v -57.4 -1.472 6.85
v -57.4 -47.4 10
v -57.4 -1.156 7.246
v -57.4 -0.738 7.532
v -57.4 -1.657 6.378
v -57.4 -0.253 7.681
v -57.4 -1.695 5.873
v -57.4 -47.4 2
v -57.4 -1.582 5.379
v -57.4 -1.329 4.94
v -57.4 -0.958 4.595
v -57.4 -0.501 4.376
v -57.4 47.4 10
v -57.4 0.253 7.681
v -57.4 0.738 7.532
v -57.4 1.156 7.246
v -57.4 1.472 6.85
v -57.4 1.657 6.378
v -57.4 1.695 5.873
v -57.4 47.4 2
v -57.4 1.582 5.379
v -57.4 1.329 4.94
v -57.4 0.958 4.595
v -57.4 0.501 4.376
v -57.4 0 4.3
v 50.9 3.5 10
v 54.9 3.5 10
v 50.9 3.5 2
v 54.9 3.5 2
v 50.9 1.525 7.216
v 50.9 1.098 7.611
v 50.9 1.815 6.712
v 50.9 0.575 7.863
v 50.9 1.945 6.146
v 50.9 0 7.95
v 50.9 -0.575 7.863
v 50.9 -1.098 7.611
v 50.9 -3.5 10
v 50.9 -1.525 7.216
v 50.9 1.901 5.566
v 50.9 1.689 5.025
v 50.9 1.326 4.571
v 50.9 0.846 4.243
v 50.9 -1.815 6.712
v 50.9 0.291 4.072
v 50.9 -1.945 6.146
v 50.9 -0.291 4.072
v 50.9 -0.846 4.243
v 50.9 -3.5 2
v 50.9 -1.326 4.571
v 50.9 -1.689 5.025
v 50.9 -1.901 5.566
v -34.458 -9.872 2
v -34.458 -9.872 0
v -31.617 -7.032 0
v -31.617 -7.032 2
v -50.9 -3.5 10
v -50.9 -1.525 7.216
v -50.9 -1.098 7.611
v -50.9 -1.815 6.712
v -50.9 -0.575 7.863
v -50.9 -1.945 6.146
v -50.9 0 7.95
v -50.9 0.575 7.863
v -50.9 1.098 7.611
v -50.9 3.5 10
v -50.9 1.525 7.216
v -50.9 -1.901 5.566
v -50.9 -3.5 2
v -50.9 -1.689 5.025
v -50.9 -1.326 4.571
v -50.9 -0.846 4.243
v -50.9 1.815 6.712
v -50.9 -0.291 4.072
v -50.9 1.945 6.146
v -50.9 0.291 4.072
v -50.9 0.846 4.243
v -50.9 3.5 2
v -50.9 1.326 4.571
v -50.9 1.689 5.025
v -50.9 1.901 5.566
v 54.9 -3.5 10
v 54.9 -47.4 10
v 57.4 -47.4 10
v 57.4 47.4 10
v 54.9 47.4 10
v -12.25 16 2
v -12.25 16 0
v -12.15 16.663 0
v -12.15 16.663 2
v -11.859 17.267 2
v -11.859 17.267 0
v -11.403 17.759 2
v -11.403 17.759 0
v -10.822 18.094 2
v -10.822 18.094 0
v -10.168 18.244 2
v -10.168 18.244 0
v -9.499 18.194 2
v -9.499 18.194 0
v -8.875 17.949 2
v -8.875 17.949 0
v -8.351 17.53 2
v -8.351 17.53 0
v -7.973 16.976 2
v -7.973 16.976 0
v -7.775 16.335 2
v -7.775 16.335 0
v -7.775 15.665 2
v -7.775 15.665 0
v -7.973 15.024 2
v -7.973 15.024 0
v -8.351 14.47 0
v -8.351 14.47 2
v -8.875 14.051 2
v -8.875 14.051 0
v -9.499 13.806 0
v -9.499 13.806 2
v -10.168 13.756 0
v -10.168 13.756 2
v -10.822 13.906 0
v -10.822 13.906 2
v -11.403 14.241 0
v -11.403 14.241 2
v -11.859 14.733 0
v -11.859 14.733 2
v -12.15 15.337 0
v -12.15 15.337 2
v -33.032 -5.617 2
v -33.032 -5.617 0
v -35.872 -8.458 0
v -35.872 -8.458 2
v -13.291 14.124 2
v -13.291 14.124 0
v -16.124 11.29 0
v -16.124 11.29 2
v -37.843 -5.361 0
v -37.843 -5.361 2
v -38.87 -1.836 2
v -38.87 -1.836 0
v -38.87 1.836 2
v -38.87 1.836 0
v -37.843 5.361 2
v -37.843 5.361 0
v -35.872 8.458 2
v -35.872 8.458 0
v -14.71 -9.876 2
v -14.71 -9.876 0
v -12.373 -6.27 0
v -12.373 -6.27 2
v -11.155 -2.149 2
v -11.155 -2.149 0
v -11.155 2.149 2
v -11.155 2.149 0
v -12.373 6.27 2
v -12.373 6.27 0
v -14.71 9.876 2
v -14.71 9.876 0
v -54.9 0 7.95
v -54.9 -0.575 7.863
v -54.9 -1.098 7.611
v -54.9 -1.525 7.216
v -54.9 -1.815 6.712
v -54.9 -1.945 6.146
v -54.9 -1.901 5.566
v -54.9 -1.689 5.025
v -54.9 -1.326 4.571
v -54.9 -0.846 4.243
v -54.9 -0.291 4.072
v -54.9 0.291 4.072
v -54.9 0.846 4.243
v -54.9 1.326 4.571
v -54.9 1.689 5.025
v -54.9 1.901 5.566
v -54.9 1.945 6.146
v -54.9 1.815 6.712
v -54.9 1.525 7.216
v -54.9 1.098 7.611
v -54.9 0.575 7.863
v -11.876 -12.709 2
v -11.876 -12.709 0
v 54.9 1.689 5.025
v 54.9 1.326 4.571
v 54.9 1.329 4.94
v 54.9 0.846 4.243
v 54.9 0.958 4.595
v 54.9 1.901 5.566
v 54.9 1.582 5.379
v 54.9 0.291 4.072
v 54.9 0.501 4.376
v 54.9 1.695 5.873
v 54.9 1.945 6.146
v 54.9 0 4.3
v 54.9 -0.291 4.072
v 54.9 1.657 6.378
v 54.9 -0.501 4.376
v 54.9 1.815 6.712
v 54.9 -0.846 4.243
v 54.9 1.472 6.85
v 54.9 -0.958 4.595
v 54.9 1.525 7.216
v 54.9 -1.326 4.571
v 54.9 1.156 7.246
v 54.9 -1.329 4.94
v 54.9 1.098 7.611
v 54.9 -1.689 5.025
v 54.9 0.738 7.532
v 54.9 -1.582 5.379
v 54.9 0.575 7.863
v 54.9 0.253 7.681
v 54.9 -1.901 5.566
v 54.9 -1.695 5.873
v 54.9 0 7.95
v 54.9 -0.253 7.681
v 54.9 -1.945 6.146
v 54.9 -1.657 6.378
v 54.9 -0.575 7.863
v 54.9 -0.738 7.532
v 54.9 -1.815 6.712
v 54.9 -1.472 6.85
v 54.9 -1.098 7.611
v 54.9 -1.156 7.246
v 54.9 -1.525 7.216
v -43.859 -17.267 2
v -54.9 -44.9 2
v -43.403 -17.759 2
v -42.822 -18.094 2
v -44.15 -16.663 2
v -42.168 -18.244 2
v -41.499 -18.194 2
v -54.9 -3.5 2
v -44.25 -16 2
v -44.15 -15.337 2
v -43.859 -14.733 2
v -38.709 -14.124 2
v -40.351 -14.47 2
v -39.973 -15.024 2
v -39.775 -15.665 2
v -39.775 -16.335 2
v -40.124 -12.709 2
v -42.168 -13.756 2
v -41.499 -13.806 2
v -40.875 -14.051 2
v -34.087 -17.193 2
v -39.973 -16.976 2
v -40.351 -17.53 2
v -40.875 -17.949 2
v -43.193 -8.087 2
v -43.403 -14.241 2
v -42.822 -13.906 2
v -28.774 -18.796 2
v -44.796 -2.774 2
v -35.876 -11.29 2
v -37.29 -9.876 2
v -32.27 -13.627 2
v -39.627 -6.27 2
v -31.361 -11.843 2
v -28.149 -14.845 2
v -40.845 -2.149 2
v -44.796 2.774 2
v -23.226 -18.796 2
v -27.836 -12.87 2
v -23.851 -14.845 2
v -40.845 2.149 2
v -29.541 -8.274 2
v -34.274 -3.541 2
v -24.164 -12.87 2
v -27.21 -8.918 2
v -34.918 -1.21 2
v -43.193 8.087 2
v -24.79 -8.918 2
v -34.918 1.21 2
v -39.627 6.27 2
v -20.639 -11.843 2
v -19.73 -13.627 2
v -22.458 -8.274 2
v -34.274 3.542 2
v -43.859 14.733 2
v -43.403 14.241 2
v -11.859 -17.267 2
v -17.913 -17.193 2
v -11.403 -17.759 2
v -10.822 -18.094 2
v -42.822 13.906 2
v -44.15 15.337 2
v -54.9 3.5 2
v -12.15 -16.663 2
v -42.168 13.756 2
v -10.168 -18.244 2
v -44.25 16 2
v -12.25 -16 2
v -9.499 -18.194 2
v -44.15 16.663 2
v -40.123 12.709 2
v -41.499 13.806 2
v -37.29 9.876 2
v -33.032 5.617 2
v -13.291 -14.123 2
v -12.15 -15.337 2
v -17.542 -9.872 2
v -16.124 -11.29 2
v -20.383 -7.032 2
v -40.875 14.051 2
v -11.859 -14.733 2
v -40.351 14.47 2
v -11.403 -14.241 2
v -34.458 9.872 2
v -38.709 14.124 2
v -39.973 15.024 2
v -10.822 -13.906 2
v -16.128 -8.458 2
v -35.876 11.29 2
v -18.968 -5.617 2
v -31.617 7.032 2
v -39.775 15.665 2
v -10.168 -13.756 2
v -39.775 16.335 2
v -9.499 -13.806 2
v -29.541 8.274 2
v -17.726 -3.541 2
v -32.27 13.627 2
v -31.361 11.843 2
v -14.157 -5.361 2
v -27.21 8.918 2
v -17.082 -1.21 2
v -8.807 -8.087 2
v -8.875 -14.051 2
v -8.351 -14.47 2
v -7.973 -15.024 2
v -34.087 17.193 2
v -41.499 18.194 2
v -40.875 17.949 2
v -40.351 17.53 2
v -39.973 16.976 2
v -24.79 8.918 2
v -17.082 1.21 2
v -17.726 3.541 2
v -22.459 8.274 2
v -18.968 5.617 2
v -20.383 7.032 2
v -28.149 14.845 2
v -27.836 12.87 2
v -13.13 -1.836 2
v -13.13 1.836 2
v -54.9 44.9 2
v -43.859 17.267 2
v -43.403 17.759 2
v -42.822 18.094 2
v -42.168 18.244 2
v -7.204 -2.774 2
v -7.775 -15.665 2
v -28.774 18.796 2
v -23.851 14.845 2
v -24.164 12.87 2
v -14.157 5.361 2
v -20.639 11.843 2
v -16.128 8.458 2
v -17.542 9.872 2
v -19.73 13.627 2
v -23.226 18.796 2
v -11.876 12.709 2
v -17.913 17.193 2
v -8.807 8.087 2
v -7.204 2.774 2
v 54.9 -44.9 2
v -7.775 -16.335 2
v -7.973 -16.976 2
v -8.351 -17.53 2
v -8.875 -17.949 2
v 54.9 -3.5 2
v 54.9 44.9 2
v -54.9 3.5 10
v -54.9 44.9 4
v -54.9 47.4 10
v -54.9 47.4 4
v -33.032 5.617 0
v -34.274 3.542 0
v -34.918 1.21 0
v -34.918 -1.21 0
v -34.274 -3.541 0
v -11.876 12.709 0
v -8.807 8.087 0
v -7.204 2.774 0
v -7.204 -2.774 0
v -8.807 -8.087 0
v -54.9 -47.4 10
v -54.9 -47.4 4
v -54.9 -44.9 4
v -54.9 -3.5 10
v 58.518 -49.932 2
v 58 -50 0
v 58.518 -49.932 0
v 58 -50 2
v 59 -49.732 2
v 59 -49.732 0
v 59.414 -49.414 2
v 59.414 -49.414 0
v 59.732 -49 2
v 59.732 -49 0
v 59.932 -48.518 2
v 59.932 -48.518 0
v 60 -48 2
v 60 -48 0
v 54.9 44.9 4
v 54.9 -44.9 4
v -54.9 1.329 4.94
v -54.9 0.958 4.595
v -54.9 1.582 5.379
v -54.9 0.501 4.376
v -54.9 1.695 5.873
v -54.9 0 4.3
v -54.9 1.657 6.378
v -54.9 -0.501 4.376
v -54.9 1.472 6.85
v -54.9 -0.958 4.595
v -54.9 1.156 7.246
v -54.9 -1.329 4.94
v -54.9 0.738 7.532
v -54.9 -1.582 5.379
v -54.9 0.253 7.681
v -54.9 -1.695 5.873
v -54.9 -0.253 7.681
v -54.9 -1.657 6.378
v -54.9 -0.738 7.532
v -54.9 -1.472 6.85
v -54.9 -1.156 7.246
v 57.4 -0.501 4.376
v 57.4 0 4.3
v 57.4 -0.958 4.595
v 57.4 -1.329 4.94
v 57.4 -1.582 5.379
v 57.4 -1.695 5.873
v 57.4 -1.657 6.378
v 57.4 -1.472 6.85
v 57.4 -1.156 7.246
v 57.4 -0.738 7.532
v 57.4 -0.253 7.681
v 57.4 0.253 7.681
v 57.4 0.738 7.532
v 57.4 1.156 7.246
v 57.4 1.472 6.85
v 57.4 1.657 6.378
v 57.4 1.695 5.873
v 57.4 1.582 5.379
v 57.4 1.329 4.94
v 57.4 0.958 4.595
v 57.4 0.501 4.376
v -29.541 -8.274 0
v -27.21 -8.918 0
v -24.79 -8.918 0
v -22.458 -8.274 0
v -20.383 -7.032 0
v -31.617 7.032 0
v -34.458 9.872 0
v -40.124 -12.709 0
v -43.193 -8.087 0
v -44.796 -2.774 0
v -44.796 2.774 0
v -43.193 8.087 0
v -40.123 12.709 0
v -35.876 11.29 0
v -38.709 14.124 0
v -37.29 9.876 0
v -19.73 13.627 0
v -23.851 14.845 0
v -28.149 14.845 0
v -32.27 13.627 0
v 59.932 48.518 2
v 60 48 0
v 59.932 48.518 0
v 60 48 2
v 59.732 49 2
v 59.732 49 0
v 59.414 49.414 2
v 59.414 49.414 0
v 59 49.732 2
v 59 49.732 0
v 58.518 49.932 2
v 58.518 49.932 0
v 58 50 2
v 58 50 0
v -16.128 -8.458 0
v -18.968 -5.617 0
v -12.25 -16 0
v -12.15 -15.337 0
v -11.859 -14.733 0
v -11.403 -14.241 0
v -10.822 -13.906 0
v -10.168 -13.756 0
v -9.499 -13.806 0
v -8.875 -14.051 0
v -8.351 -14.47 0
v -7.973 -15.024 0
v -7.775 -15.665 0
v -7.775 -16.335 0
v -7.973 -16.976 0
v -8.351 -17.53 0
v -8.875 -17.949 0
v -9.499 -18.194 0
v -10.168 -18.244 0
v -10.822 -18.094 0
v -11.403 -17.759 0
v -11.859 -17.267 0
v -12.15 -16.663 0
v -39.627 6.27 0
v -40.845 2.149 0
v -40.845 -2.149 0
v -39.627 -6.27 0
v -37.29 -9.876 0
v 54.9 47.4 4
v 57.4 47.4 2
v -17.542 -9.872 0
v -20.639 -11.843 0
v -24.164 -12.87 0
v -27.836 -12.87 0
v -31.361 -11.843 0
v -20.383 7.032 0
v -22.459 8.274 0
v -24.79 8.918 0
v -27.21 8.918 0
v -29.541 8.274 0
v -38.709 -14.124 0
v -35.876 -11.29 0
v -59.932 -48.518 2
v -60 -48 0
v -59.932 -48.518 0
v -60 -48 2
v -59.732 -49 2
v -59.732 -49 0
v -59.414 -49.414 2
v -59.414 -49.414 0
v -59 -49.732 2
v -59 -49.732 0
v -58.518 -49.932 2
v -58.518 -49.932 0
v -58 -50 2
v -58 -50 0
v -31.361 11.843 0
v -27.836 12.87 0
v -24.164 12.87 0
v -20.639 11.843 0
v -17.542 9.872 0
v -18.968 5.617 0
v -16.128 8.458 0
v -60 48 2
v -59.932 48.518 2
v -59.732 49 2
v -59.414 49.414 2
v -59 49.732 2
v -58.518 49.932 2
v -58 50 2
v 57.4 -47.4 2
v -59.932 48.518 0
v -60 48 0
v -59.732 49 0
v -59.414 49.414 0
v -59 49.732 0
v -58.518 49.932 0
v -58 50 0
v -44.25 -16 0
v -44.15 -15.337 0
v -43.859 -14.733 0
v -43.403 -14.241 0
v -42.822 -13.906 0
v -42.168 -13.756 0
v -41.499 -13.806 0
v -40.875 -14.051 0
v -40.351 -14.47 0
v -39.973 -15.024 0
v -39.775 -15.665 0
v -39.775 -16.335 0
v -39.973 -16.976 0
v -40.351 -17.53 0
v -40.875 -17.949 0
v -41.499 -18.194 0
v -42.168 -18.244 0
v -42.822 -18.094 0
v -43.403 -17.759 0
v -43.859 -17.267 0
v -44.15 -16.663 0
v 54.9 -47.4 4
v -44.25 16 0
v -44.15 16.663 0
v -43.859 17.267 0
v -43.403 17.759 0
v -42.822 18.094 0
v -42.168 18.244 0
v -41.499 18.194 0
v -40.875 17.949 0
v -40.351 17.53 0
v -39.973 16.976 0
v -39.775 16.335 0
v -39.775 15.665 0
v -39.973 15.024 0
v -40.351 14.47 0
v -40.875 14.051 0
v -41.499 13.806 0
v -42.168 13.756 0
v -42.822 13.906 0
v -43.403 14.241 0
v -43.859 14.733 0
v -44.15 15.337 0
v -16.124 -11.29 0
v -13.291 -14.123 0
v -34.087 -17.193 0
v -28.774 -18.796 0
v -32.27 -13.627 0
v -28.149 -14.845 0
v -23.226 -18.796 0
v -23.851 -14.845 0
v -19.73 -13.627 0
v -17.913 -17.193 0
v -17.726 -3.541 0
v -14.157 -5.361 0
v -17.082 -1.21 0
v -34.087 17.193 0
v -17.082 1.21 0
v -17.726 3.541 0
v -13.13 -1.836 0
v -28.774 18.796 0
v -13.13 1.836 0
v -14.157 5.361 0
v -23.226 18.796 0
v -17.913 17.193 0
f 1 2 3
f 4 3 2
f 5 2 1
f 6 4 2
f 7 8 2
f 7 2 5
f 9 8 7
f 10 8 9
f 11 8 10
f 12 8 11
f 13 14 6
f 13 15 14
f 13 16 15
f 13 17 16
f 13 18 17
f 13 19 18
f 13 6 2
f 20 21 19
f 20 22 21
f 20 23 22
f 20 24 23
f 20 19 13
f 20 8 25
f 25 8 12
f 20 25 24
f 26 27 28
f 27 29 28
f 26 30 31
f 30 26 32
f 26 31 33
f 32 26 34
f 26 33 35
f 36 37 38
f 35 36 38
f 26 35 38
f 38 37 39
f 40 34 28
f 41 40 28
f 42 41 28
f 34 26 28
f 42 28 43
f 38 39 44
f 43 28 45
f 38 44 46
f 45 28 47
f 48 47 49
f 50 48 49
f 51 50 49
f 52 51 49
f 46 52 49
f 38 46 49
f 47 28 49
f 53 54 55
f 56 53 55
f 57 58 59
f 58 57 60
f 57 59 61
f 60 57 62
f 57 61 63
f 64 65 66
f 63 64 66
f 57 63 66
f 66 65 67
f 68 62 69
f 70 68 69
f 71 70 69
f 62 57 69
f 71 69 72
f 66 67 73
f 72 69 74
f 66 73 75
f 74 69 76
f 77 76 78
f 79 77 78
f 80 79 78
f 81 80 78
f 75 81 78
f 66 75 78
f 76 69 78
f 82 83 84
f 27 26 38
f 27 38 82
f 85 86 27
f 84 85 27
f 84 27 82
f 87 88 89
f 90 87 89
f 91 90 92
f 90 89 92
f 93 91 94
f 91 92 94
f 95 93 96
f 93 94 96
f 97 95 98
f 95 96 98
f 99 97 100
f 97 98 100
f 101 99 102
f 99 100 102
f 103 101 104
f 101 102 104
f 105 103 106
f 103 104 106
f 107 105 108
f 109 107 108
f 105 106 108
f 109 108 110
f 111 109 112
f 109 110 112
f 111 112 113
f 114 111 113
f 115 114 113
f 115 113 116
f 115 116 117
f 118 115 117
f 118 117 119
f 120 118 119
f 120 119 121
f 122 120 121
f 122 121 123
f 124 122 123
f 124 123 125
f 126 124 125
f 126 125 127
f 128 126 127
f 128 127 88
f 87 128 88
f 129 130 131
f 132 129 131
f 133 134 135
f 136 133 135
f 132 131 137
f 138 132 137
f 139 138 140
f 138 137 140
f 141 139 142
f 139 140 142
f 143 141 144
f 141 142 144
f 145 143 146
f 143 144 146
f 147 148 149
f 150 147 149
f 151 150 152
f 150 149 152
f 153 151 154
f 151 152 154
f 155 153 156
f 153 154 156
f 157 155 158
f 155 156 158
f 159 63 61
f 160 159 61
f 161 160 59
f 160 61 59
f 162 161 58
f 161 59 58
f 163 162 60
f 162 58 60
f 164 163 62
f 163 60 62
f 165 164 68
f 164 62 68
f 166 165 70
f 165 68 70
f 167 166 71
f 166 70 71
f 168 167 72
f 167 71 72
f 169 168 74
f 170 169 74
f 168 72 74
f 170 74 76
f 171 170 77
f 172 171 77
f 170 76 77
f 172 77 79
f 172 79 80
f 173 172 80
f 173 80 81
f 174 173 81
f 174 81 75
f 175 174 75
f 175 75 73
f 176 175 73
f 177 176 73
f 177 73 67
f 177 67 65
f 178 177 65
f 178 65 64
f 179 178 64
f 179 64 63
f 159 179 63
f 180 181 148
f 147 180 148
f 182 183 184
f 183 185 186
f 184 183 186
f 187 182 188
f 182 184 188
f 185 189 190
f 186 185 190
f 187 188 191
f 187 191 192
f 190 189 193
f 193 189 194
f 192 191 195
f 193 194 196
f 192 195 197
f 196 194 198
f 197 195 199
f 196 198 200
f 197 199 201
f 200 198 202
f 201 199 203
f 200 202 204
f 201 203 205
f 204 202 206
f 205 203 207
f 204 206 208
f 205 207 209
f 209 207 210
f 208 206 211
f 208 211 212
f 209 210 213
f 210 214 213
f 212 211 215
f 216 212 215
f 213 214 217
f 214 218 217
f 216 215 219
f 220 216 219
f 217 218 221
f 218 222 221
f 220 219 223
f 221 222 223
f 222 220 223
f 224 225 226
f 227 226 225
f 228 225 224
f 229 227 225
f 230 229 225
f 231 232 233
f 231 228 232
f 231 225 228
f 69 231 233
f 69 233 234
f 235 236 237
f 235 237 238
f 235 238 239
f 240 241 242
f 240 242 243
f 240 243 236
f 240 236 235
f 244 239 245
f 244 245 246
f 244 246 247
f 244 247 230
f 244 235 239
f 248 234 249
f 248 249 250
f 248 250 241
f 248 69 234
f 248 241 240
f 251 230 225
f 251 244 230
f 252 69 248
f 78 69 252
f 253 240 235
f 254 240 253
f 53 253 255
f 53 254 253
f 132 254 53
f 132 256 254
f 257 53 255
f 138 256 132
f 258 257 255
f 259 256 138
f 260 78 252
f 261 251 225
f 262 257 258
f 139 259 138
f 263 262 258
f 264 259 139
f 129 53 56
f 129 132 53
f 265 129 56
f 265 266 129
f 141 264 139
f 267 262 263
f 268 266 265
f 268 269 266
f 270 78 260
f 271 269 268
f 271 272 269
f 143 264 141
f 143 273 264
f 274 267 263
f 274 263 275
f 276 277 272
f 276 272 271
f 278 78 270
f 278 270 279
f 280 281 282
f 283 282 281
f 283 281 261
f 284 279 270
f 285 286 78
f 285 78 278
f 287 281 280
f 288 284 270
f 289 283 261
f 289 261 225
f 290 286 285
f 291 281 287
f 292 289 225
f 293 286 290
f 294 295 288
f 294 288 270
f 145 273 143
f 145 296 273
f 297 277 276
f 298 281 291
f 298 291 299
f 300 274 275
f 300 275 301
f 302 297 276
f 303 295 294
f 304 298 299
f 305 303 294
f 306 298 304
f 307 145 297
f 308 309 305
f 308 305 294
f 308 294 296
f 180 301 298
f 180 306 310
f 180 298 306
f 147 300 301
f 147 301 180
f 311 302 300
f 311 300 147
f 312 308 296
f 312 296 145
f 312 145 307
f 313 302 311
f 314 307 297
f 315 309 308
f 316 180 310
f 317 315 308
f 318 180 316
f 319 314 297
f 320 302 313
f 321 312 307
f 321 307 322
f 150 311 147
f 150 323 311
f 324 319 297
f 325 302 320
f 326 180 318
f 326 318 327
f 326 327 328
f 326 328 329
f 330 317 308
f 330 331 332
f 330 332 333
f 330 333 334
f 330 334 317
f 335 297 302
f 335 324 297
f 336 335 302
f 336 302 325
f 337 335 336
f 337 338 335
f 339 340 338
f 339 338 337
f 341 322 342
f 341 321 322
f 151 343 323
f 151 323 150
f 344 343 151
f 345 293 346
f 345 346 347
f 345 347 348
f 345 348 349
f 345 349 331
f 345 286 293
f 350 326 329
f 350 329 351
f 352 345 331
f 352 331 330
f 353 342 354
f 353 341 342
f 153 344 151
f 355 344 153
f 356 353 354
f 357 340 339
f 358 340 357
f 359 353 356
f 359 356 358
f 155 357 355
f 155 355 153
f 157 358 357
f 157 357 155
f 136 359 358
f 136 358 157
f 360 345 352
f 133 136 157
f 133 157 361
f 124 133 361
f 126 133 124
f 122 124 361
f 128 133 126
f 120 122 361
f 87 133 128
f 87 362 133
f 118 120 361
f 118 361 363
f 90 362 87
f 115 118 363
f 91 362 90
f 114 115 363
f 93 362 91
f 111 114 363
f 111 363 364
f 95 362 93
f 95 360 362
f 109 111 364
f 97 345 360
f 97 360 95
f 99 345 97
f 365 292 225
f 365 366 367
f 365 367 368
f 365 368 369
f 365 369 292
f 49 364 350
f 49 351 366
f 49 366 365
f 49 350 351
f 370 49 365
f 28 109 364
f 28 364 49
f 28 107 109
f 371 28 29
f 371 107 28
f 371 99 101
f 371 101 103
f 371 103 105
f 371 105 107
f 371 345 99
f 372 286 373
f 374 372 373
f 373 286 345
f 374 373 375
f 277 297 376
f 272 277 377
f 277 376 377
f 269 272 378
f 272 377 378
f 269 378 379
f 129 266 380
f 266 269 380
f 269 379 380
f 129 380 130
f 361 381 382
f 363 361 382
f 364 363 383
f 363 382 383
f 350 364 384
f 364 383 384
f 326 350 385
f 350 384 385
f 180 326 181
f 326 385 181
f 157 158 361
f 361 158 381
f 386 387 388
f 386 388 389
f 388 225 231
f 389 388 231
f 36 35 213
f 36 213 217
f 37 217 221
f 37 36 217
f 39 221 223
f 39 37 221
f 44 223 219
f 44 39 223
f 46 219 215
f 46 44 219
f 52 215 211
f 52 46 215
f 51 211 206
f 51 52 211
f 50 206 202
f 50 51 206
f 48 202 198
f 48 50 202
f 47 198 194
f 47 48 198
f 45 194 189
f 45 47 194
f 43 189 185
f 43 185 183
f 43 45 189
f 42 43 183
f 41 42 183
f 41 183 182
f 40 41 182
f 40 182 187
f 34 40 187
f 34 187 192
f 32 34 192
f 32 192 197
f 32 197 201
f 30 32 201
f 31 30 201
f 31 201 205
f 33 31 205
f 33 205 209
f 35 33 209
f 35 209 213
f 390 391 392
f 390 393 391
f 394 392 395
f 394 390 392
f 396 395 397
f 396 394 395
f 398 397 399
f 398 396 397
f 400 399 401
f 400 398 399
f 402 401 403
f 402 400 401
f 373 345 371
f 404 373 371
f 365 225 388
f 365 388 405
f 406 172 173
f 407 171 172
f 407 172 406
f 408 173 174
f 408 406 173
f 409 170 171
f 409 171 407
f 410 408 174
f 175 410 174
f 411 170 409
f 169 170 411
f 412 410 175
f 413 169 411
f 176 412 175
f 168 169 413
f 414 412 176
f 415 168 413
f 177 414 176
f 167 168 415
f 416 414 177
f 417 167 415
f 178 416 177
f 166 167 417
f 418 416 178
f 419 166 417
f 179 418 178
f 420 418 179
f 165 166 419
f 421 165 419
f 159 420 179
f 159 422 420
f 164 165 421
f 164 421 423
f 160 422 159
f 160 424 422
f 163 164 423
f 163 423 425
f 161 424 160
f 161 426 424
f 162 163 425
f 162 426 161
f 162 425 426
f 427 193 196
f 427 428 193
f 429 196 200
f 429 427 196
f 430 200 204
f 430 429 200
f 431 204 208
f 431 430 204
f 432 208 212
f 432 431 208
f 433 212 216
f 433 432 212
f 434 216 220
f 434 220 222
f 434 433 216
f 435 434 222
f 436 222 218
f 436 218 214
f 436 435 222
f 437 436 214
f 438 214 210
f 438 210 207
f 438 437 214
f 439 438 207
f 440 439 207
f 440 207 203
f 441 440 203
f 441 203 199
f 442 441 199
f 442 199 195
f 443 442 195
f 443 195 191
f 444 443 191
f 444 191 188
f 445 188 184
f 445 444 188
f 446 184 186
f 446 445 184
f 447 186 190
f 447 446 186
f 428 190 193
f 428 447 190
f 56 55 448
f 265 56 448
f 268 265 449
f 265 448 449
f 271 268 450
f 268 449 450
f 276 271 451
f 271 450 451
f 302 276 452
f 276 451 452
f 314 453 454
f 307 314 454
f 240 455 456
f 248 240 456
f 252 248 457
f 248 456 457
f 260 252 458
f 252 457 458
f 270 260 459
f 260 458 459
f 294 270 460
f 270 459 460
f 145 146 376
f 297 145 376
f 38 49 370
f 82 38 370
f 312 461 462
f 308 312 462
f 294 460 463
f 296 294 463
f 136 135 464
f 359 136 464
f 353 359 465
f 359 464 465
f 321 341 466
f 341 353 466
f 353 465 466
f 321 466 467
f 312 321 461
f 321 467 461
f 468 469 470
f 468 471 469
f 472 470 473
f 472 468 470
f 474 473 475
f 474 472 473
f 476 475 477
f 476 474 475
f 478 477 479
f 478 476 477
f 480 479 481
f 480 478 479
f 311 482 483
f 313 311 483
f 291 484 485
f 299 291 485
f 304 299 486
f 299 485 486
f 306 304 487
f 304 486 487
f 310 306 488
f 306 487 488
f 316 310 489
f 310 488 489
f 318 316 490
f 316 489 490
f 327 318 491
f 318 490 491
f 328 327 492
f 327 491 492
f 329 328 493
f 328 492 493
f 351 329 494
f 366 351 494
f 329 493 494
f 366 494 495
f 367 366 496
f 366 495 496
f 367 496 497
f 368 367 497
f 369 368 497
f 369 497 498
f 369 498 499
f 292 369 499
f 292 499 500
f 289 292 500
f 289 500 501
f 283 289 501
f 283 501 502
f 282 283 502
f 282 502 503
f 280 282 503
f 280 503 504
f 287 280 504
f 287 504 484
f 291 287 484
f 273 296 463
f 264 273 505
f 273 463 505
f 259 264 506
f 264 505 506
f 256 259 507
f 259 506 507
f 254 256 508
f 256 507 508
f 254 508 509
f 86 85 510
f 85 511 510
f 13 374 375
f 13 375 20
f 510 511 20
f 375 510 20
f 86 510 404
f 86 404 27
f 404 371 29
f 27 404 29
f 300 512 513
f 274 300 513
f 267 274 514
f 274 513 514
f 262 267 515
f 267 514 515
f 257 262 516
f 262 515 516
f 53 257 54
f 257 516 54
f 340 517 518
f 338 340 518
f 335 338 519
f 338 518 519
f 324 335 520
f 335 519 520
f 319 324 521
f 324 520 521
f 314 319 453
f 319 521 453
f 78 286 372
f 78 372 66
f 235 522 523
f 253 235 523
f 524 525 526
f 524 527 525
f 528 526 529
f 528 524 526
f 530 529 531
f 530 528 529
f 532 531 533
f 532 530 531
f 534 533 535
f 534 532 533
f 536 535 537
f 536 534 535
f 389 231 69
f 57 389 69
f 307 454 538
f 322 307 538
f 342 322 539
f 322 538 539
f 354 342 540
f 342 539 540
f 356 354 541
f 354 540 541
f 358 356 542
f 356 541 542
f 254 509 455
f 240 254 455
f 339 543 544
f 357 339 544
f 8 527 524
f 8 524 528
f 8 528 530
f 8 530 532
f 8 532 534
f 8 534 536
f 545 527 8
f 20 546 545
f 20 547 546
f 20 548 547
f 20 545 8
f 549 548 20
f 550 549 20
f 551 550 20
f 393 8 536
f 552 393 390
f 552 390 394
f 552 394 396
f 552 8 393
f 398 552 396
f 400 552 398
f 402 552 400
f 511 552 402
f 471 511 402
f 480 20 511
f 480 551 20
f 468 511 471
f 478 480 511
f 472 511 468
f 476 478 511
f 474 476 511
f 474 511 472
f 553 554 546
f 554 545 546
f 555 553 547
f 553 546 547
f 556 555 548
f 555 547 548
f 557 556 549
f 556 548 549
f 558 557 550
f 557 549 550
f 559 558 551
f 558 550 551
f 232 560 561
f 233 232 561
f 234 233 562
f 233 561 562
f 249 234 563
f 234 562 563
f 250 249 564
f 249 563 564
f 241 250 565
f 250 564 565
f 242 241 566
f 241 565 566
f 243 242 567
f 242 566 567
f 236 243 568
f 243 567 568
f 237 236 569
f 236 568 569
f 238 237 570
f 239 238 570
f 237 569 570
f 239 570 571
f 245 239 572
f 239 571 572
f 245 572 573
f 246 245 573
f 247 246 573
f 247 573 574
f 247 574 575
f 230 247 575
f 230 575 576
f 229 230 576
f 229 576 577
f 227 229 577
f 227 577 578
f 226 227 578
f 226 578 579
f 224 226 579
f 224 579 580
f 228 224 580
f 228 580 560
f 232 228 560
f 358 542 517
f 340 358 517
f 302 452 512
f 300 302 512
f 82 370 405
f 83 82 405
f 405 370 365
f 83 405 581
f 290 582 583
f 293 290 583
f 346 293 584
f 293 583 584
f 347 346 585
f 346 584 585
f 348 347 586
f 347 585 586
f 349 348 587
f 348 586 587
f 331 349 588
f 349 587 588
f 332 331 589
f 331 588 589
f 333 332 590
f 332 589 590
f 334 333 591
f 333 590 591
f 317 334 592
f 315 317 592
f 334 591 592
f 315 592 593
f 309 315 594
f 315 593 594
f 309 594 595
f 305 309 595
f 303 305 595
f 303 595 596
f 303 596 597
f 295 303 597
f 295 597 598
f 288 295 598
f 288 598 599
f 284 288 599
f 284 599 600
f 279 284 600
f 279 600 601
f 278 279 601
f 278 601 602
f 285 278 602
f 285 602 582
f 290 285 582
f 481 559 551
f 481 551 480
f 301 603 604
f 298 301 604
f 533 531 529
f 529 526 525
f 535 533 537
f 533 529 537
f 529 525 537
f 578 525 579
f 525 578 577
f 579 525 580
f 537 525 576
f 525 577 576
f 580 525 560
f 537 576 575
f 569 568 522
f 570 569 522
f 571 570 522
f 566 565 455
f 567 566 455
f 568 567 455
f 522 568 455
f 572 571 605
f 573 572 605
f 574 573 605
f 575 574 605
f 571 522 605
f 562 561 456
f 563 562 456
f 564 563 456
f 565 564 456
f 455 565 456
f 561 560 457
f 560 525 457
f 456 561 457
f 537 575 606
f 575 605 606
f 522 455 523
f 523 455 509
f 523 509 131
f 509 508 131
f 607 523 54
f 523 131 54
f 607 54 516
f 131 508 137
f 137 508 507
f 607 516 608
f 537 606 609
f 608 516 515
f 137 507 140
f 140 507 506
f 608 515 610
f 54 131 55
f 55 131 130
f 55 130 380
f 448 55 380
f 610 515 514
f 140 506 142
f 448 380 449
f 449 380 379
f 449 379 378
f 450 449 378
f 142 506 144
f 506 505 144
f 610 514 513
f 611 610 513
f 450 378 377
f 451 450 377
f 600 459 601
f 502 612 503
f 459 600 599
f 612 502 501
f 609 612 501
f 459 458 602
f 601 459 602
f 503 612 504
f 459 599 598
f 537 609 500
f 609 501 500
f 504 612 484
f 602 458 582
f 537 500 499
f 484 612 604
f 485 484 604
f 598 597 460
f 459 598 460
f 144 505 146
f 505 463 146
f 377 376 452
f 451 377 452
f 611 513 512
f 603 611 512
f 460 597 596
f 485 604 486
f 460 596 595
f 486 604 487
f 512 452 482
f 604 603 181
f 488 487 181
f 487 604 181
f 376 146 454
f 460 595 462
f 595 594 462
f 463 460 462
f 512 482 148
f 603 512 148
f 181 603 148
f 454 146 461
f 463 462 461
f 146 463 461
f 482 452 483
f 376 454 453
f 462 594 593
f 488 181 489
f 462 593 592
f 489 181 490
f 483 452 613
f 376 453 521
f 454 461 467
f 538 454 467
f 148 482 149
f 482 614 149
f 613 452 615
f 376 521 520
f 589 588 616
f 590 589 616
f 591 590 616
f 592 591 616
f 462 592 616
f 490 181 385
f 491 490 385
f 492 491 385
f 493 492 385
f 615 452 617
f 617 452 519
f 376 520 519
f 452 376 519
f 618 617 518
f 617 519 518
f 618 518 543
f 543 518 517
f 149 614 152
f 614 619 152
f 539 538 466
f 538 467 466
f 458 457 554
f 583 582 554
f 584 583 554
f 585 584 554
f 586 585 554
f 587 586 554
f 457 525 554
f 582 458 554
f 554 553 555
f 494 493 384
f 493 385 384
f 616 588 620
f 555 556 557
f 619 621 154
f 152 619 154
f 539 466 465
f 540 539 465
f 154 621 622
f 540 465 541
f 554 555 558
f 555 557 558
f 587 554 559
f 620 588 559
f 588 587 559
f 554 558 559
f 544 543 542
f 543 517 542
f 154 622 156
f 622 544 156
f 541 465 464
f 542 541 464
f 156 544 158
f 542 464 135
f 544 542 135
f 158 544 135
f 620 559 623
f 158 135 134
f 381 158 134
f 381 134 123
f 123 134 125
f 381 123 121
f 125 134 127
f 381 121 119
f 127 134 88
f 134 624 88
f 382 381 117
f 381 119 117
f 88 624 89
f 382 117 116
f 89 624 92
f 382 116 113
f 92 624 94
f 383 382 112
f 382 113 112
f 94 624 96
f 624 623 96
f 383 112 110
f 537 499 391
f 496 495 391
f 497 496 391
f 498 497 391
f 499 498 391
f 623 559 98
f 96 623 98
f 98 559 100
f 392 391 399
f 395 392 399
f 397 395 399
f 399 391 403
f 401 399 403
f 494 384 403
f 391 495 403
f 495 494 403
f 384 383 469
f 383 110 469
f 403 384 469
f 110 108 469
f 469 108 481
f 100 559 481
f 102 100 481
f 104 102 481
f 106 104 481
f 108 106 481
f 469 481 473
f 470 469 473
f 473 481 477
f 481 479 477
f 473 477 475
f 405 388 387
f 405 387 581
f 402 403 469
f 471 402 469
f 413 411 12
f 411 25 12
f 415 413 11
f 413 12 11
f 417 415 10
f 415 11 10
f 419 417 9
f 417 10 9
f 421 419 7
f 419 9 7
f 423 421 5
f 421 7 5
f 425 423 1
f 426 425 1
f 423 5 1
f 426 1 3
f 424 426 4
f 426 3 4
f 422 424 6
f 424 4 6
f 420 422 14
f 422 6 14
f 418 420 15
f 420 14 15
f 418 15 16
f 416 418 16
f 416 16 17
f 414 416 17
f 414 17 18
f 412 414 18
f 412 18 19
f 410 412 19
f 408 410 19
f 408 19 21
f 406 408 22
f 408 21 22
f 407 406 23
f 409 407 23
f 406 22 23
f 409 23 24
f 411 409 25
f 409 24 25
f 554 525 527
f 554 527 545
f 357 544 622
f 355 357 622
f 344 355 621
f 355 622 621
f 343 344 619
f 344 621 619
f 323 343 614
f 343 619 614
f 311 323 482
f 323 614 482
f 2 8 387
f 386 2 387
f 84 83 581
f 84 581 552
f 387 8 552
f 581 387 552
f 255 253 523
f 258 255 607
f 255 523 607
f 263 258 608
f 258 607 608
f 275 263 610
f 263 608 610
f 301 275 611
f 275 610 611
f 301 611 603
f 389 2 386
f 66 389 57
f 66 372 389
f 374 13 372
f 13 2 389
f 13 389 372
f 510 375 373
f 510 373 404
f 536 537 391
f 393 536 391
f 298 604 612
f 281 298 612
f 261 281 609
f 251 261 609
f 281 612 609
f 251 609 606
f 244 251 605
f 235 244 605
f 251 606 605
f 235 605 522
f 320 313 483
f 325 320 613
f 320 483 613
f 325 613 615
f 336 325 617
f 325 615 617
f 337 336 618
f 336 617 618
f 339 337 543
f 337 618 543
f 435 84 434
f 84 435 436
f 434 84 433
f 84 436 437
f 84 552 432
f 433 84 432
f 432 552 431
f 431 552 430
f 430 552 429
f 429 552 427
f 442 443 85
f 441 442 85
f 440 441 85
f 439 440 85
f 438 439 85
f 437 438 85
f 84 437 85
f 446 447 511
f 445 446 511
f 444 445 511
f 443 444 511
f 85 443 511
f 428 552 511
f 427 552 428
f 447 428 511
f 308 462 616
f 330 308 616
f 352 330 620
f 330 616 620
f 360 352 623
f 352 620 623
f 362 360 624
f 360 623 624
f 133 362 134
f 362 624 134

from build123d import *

# Parameters (mm, degrees)
P_DORYS_W                                         = 120
P_DORYS_H                                         = 100
P_IDAT_VYSUNUT_M1_DEPTH                           = 2
ZAOBLIT1_R                                        = 2
SKICA2_W                                          = 114.8
SKICA2_H                                          = 94.8
SKICA2_W_2                                        = 109.8
SKICA2_H_2                                        = 89.8
SKICA2_W_3                                        = 4
SKICA2_H_3                                        = 7
SKICA2_H_4                                        = 3.5
P_IDAT_VYSUNUT_M2_DEPTH                           = 2
P_IDAT_VYSUNUT_M3_DEPTH                           = 6
V_LCOV_ZAHLOUBEN_PRO_M6_ROUBY_S_V_LCO_D           = 3.4
V_LCOV_ZAHLOUBEN_PRO_M6_ROUBY_S_V_LCO_DEPTH       = 9.1
V_LCOV_ZAHLOUBEN_PRO_M6_ROUBY_S_V_LCO_CBORE_D     = 3.9
V_LCOV_ZAHLOUBEN_PRO_M6_ROUBY_S_V_LCO_CBORE_DEPTH = 4
SKICA7_R                                          = 2.25
ODEBRAT_VYSUNUT_M1_DEPTH                          = 6


with BuildPart() as part:
    # půdorys → Přidat vysunutím1 (new body)
    with BuildSketch(Plane.XY):
        Rectangle(P_DORYS_W, P_DORYS_H)
    extrude(amount=P_IDAT_VYSUNUT_M1_DEPTH)

    # Zaoblit1
    zaoblit1_edges = [part.edges().sort_by_distance(p)[0] for p in [
        (60, -50, 1),
        (-60, -50, 1),
        (-60, 50, 1),
        (60, 50, 1),
    ]]
    fillet(zaoblit1_edges, radius=ZAOBLIT1_R)

    # Skica2 → Přidat vysunutím2 (add)
    # profile 1 of 4: a face of its own
    with BuildSketch(Plane.XY.offset(2)):
        Rectangle(SKICA2_W, SKICA2_H)
        Rectangle(SKICA2_W_2, SKICA2_H_2, mode=Mode.SUBTRACT)
    # profile 2 of 4: a face of its own
    with BuildSketch(Plane.XY.offset(2)):
        with Locations((52.9, 0)):
            Rectangle(SKICA2_W_3, SKICA2_H_3)
    # profile 3 of 4: a face of its own
    with BuildSketch(Plane.XY.offset(2)):
        with Locations((-52.9, -1.75)):
            Rectangle(SKICA2_W_3, SKICA2_H_4)
    # profile 4 of 4: a face of its own
    with BuildSketch(Plane.XY.offset(2)):
        with Locations((-52.9, 1.75)):
            Rectangle(SKICA2_W_3, SKICA2_H_4)
    extrude(amount=P_IDAT_VYSUNUT_M2_DEPTH)

    # Skica3 → Přidat vysunutím3 (add)
    with BuildSketch(Plane.XY.offset(4)):
        Polygon((54.9, -47.4), (57.4, -47.4), (57.4, 47.4), (54.9, 47.4), (54.9, 44.9), (54.9, 3.5), (50.9, 3.5), (50.9, -3.5), (54.9, -3.5), (54.9, -44.9), align=None)
        Polygon((-57.4, -47.4), (-54.9, -47.4), (-54.9, -44.9), (-54.9, -3.5), (-50.9, -3.5), (-50.9, 3.5), (-54.9, 3.5), (-54.9, 44.9), (-54.9, 47.4), (-57.4, 47.4), align=None)
    extrude(amount=P_IDAT_VYSUNUT_M3_DEPTH)

    # Válcové zahloubení pro M6 šrouby s válcovou hlavou zaoblenou1
    with Locations(Plane(origin=(-50.9, 0, 6), x_dir=(0, 0, 1), z_dir=(1, 0, 0))):
        with Locations((0, 0)):
            v_lcov_zahlouben_pro_m6_rouby_s_v_lco = CounterBoreHole(V_LCOV_ZAHLOUBEN_PRO_M6_ROUBY_S_V_LCO_D / 2, V_LCOV_ZAHLOUBEN_PRO_M6_ROUBY_S_V_LCO_CBORE_D / 2, V_LCOV_ZAHLOUBEN_PRO_M6_ROUBY_S_V_LCO_CBORE_DEPTH, depth=V_LCOV_ZAHLOUBEN_PRO_M6_ROUBY_S_V_LCO_DEPTH)

    # Zrcadlit1: Válcové zahloubení pro M6 šrouby s válcovou hlavou zaoblenou1 across plane
    add(v_lcov_zahlouben_pro_m6_rouby_s_v_lco.mirror(Plane(origin=(0, 0, 0), x_dir=(0, 0, 1), z_dir=(1, 0, 0))), mode=Mode.SUBTRACT)

    # Skica7 → Odebrat vysunutím1 (cut)
    with BuildSketch(Plane(origin=(0, 0, 0), x_dir=(-1, 0, 0), z_dir=(0, 0, -1))):
        with BuildLine():
            ThreePointArc((37.290080195, 9.875934852), (41, 2.4173e-05), (37.290112025, -9.875898463))
            Line((37.290112025, -9.875898463), (40.123514646, -12.709301084))
            ThreePointArc((40.123514646, -12.709301084), (45, 2.4153e-05), (40.123482334, 12.709336991))
            Line((40.123482334, 12.709336991), (37.290080195, 9.875934852))
        make_face()
        with BuildLine():
            ThreePointArc((35.872258171, -8.458044609), (39, 2.4191e-05), (35.872226693, 8.45808135))
            Line((35.872226693, 8.45808135), (33.031631805, 5.617486462))
            ThreePointArc((33.031631805, 5.617486462), (35, 2.427e-05), (33.031662102, -5.617448539))
            Line((33.031662102, -5.617448539), (35.872258171, -8.458044609))
        make_face()
        with Locations((42, -16)):
            Circle(SKICA7_R)
        with Locations((42, 16)):
            Circle(SKICA7_R)
        with BuildLine():
            ThreePointArc((16.124101537, 11.290112025), (26, 15), (35.875898463, 11.290112025))
            Line((35.875898463, 11.290112025), (38.709301084, 14.123514646))
            ThreePointArc((38.709301084, 14.123514646), (26, 19), (13.290698916, 14.123514646))
            Line((13.290698916, 14.123514646), (16.124101537, 11.290112025))
        make_face()
        with BuildLine():
            Line((38.709301084, -14.123514646), (35.875898463, -11.290112025))
            ThreePointArc((35.875898463, -11.290112025), (25.999975827, -15), (16.124065148, -11.290080195))
            Line((16.124065148, -11.290080195), (13.290663009, -14.123482334))
            ThreePointArc((13.290663009, -14.123482334), (25.999975847, -19), (38.709301084, -14.123514646))
        make_face()
        with BuildLine():
            Line((31.617448539, 7.031662102), (34.458044609, 9.872258171))
            ThreePointArc((34.458044609, 9.872258171), (26, 13), (17.541955391, 9.872258171))
            Line((17.541955391, 9.872258171), (20.382551461, 7.031662102))
            ThreePointArc((20.382551461, 7.031662102), (26, 9), (31.617448539, 7.031662102))
        make_face()
        with BuildLine():
            ThreePointArc((17.54191865, -9.872226693), (25.999975809, -13), (34.458044609, -9.872258171))
            Line((34.458044609, -9.872258171), (31.617448539, -7.031662102))
            ThreePointArc((31.617448539, -7.031662102), (25.99997573, -9), (20.382513538, -7.031631805))
            Line((20.382513538, -7.031631805), (17.54191865, -9.872226693))
        make_face()
        with BuildLine():
            ThreePointArc((18.968337898, -5.617448539), (17, 0), (18.968337898, 5.617448539))
            Line((18.968337898, 5.617448539), (16.127741829, 8.458044609))
            ThreePointArc((16.127741829, 8.458044609), (13, 0), (16.127741829, -8.458044609))
            Line((16.127741829, -8.458044609), (18.968337898, -5.617448539))
        make_face()
        with Locations((10, 16)):
            Circle(SKICA7_R)
        with BuildLine():
            Line((14.709887975, 9.875898463), (11.876485354, 12.709301084))
            ThreePointArc((11.876485354, 12.709301084), (7, 0), (11.876485354, -12.709301084))
            Line((11.876485354, -12.709301084), (14.709887975, -9.875898463))
            ThreePointArc((14.709887975, -9.875898463), (11, 0), (14.709887975, 9.875898463))
        make_face()
        with Locations((10, -16)):
            Circle(SKICA7_R)
    extrude(amount=-ODEBRAT_VYSUNUT_M1_DEPTH, mode=Mode.SUBTRACT)


solid = part.part
